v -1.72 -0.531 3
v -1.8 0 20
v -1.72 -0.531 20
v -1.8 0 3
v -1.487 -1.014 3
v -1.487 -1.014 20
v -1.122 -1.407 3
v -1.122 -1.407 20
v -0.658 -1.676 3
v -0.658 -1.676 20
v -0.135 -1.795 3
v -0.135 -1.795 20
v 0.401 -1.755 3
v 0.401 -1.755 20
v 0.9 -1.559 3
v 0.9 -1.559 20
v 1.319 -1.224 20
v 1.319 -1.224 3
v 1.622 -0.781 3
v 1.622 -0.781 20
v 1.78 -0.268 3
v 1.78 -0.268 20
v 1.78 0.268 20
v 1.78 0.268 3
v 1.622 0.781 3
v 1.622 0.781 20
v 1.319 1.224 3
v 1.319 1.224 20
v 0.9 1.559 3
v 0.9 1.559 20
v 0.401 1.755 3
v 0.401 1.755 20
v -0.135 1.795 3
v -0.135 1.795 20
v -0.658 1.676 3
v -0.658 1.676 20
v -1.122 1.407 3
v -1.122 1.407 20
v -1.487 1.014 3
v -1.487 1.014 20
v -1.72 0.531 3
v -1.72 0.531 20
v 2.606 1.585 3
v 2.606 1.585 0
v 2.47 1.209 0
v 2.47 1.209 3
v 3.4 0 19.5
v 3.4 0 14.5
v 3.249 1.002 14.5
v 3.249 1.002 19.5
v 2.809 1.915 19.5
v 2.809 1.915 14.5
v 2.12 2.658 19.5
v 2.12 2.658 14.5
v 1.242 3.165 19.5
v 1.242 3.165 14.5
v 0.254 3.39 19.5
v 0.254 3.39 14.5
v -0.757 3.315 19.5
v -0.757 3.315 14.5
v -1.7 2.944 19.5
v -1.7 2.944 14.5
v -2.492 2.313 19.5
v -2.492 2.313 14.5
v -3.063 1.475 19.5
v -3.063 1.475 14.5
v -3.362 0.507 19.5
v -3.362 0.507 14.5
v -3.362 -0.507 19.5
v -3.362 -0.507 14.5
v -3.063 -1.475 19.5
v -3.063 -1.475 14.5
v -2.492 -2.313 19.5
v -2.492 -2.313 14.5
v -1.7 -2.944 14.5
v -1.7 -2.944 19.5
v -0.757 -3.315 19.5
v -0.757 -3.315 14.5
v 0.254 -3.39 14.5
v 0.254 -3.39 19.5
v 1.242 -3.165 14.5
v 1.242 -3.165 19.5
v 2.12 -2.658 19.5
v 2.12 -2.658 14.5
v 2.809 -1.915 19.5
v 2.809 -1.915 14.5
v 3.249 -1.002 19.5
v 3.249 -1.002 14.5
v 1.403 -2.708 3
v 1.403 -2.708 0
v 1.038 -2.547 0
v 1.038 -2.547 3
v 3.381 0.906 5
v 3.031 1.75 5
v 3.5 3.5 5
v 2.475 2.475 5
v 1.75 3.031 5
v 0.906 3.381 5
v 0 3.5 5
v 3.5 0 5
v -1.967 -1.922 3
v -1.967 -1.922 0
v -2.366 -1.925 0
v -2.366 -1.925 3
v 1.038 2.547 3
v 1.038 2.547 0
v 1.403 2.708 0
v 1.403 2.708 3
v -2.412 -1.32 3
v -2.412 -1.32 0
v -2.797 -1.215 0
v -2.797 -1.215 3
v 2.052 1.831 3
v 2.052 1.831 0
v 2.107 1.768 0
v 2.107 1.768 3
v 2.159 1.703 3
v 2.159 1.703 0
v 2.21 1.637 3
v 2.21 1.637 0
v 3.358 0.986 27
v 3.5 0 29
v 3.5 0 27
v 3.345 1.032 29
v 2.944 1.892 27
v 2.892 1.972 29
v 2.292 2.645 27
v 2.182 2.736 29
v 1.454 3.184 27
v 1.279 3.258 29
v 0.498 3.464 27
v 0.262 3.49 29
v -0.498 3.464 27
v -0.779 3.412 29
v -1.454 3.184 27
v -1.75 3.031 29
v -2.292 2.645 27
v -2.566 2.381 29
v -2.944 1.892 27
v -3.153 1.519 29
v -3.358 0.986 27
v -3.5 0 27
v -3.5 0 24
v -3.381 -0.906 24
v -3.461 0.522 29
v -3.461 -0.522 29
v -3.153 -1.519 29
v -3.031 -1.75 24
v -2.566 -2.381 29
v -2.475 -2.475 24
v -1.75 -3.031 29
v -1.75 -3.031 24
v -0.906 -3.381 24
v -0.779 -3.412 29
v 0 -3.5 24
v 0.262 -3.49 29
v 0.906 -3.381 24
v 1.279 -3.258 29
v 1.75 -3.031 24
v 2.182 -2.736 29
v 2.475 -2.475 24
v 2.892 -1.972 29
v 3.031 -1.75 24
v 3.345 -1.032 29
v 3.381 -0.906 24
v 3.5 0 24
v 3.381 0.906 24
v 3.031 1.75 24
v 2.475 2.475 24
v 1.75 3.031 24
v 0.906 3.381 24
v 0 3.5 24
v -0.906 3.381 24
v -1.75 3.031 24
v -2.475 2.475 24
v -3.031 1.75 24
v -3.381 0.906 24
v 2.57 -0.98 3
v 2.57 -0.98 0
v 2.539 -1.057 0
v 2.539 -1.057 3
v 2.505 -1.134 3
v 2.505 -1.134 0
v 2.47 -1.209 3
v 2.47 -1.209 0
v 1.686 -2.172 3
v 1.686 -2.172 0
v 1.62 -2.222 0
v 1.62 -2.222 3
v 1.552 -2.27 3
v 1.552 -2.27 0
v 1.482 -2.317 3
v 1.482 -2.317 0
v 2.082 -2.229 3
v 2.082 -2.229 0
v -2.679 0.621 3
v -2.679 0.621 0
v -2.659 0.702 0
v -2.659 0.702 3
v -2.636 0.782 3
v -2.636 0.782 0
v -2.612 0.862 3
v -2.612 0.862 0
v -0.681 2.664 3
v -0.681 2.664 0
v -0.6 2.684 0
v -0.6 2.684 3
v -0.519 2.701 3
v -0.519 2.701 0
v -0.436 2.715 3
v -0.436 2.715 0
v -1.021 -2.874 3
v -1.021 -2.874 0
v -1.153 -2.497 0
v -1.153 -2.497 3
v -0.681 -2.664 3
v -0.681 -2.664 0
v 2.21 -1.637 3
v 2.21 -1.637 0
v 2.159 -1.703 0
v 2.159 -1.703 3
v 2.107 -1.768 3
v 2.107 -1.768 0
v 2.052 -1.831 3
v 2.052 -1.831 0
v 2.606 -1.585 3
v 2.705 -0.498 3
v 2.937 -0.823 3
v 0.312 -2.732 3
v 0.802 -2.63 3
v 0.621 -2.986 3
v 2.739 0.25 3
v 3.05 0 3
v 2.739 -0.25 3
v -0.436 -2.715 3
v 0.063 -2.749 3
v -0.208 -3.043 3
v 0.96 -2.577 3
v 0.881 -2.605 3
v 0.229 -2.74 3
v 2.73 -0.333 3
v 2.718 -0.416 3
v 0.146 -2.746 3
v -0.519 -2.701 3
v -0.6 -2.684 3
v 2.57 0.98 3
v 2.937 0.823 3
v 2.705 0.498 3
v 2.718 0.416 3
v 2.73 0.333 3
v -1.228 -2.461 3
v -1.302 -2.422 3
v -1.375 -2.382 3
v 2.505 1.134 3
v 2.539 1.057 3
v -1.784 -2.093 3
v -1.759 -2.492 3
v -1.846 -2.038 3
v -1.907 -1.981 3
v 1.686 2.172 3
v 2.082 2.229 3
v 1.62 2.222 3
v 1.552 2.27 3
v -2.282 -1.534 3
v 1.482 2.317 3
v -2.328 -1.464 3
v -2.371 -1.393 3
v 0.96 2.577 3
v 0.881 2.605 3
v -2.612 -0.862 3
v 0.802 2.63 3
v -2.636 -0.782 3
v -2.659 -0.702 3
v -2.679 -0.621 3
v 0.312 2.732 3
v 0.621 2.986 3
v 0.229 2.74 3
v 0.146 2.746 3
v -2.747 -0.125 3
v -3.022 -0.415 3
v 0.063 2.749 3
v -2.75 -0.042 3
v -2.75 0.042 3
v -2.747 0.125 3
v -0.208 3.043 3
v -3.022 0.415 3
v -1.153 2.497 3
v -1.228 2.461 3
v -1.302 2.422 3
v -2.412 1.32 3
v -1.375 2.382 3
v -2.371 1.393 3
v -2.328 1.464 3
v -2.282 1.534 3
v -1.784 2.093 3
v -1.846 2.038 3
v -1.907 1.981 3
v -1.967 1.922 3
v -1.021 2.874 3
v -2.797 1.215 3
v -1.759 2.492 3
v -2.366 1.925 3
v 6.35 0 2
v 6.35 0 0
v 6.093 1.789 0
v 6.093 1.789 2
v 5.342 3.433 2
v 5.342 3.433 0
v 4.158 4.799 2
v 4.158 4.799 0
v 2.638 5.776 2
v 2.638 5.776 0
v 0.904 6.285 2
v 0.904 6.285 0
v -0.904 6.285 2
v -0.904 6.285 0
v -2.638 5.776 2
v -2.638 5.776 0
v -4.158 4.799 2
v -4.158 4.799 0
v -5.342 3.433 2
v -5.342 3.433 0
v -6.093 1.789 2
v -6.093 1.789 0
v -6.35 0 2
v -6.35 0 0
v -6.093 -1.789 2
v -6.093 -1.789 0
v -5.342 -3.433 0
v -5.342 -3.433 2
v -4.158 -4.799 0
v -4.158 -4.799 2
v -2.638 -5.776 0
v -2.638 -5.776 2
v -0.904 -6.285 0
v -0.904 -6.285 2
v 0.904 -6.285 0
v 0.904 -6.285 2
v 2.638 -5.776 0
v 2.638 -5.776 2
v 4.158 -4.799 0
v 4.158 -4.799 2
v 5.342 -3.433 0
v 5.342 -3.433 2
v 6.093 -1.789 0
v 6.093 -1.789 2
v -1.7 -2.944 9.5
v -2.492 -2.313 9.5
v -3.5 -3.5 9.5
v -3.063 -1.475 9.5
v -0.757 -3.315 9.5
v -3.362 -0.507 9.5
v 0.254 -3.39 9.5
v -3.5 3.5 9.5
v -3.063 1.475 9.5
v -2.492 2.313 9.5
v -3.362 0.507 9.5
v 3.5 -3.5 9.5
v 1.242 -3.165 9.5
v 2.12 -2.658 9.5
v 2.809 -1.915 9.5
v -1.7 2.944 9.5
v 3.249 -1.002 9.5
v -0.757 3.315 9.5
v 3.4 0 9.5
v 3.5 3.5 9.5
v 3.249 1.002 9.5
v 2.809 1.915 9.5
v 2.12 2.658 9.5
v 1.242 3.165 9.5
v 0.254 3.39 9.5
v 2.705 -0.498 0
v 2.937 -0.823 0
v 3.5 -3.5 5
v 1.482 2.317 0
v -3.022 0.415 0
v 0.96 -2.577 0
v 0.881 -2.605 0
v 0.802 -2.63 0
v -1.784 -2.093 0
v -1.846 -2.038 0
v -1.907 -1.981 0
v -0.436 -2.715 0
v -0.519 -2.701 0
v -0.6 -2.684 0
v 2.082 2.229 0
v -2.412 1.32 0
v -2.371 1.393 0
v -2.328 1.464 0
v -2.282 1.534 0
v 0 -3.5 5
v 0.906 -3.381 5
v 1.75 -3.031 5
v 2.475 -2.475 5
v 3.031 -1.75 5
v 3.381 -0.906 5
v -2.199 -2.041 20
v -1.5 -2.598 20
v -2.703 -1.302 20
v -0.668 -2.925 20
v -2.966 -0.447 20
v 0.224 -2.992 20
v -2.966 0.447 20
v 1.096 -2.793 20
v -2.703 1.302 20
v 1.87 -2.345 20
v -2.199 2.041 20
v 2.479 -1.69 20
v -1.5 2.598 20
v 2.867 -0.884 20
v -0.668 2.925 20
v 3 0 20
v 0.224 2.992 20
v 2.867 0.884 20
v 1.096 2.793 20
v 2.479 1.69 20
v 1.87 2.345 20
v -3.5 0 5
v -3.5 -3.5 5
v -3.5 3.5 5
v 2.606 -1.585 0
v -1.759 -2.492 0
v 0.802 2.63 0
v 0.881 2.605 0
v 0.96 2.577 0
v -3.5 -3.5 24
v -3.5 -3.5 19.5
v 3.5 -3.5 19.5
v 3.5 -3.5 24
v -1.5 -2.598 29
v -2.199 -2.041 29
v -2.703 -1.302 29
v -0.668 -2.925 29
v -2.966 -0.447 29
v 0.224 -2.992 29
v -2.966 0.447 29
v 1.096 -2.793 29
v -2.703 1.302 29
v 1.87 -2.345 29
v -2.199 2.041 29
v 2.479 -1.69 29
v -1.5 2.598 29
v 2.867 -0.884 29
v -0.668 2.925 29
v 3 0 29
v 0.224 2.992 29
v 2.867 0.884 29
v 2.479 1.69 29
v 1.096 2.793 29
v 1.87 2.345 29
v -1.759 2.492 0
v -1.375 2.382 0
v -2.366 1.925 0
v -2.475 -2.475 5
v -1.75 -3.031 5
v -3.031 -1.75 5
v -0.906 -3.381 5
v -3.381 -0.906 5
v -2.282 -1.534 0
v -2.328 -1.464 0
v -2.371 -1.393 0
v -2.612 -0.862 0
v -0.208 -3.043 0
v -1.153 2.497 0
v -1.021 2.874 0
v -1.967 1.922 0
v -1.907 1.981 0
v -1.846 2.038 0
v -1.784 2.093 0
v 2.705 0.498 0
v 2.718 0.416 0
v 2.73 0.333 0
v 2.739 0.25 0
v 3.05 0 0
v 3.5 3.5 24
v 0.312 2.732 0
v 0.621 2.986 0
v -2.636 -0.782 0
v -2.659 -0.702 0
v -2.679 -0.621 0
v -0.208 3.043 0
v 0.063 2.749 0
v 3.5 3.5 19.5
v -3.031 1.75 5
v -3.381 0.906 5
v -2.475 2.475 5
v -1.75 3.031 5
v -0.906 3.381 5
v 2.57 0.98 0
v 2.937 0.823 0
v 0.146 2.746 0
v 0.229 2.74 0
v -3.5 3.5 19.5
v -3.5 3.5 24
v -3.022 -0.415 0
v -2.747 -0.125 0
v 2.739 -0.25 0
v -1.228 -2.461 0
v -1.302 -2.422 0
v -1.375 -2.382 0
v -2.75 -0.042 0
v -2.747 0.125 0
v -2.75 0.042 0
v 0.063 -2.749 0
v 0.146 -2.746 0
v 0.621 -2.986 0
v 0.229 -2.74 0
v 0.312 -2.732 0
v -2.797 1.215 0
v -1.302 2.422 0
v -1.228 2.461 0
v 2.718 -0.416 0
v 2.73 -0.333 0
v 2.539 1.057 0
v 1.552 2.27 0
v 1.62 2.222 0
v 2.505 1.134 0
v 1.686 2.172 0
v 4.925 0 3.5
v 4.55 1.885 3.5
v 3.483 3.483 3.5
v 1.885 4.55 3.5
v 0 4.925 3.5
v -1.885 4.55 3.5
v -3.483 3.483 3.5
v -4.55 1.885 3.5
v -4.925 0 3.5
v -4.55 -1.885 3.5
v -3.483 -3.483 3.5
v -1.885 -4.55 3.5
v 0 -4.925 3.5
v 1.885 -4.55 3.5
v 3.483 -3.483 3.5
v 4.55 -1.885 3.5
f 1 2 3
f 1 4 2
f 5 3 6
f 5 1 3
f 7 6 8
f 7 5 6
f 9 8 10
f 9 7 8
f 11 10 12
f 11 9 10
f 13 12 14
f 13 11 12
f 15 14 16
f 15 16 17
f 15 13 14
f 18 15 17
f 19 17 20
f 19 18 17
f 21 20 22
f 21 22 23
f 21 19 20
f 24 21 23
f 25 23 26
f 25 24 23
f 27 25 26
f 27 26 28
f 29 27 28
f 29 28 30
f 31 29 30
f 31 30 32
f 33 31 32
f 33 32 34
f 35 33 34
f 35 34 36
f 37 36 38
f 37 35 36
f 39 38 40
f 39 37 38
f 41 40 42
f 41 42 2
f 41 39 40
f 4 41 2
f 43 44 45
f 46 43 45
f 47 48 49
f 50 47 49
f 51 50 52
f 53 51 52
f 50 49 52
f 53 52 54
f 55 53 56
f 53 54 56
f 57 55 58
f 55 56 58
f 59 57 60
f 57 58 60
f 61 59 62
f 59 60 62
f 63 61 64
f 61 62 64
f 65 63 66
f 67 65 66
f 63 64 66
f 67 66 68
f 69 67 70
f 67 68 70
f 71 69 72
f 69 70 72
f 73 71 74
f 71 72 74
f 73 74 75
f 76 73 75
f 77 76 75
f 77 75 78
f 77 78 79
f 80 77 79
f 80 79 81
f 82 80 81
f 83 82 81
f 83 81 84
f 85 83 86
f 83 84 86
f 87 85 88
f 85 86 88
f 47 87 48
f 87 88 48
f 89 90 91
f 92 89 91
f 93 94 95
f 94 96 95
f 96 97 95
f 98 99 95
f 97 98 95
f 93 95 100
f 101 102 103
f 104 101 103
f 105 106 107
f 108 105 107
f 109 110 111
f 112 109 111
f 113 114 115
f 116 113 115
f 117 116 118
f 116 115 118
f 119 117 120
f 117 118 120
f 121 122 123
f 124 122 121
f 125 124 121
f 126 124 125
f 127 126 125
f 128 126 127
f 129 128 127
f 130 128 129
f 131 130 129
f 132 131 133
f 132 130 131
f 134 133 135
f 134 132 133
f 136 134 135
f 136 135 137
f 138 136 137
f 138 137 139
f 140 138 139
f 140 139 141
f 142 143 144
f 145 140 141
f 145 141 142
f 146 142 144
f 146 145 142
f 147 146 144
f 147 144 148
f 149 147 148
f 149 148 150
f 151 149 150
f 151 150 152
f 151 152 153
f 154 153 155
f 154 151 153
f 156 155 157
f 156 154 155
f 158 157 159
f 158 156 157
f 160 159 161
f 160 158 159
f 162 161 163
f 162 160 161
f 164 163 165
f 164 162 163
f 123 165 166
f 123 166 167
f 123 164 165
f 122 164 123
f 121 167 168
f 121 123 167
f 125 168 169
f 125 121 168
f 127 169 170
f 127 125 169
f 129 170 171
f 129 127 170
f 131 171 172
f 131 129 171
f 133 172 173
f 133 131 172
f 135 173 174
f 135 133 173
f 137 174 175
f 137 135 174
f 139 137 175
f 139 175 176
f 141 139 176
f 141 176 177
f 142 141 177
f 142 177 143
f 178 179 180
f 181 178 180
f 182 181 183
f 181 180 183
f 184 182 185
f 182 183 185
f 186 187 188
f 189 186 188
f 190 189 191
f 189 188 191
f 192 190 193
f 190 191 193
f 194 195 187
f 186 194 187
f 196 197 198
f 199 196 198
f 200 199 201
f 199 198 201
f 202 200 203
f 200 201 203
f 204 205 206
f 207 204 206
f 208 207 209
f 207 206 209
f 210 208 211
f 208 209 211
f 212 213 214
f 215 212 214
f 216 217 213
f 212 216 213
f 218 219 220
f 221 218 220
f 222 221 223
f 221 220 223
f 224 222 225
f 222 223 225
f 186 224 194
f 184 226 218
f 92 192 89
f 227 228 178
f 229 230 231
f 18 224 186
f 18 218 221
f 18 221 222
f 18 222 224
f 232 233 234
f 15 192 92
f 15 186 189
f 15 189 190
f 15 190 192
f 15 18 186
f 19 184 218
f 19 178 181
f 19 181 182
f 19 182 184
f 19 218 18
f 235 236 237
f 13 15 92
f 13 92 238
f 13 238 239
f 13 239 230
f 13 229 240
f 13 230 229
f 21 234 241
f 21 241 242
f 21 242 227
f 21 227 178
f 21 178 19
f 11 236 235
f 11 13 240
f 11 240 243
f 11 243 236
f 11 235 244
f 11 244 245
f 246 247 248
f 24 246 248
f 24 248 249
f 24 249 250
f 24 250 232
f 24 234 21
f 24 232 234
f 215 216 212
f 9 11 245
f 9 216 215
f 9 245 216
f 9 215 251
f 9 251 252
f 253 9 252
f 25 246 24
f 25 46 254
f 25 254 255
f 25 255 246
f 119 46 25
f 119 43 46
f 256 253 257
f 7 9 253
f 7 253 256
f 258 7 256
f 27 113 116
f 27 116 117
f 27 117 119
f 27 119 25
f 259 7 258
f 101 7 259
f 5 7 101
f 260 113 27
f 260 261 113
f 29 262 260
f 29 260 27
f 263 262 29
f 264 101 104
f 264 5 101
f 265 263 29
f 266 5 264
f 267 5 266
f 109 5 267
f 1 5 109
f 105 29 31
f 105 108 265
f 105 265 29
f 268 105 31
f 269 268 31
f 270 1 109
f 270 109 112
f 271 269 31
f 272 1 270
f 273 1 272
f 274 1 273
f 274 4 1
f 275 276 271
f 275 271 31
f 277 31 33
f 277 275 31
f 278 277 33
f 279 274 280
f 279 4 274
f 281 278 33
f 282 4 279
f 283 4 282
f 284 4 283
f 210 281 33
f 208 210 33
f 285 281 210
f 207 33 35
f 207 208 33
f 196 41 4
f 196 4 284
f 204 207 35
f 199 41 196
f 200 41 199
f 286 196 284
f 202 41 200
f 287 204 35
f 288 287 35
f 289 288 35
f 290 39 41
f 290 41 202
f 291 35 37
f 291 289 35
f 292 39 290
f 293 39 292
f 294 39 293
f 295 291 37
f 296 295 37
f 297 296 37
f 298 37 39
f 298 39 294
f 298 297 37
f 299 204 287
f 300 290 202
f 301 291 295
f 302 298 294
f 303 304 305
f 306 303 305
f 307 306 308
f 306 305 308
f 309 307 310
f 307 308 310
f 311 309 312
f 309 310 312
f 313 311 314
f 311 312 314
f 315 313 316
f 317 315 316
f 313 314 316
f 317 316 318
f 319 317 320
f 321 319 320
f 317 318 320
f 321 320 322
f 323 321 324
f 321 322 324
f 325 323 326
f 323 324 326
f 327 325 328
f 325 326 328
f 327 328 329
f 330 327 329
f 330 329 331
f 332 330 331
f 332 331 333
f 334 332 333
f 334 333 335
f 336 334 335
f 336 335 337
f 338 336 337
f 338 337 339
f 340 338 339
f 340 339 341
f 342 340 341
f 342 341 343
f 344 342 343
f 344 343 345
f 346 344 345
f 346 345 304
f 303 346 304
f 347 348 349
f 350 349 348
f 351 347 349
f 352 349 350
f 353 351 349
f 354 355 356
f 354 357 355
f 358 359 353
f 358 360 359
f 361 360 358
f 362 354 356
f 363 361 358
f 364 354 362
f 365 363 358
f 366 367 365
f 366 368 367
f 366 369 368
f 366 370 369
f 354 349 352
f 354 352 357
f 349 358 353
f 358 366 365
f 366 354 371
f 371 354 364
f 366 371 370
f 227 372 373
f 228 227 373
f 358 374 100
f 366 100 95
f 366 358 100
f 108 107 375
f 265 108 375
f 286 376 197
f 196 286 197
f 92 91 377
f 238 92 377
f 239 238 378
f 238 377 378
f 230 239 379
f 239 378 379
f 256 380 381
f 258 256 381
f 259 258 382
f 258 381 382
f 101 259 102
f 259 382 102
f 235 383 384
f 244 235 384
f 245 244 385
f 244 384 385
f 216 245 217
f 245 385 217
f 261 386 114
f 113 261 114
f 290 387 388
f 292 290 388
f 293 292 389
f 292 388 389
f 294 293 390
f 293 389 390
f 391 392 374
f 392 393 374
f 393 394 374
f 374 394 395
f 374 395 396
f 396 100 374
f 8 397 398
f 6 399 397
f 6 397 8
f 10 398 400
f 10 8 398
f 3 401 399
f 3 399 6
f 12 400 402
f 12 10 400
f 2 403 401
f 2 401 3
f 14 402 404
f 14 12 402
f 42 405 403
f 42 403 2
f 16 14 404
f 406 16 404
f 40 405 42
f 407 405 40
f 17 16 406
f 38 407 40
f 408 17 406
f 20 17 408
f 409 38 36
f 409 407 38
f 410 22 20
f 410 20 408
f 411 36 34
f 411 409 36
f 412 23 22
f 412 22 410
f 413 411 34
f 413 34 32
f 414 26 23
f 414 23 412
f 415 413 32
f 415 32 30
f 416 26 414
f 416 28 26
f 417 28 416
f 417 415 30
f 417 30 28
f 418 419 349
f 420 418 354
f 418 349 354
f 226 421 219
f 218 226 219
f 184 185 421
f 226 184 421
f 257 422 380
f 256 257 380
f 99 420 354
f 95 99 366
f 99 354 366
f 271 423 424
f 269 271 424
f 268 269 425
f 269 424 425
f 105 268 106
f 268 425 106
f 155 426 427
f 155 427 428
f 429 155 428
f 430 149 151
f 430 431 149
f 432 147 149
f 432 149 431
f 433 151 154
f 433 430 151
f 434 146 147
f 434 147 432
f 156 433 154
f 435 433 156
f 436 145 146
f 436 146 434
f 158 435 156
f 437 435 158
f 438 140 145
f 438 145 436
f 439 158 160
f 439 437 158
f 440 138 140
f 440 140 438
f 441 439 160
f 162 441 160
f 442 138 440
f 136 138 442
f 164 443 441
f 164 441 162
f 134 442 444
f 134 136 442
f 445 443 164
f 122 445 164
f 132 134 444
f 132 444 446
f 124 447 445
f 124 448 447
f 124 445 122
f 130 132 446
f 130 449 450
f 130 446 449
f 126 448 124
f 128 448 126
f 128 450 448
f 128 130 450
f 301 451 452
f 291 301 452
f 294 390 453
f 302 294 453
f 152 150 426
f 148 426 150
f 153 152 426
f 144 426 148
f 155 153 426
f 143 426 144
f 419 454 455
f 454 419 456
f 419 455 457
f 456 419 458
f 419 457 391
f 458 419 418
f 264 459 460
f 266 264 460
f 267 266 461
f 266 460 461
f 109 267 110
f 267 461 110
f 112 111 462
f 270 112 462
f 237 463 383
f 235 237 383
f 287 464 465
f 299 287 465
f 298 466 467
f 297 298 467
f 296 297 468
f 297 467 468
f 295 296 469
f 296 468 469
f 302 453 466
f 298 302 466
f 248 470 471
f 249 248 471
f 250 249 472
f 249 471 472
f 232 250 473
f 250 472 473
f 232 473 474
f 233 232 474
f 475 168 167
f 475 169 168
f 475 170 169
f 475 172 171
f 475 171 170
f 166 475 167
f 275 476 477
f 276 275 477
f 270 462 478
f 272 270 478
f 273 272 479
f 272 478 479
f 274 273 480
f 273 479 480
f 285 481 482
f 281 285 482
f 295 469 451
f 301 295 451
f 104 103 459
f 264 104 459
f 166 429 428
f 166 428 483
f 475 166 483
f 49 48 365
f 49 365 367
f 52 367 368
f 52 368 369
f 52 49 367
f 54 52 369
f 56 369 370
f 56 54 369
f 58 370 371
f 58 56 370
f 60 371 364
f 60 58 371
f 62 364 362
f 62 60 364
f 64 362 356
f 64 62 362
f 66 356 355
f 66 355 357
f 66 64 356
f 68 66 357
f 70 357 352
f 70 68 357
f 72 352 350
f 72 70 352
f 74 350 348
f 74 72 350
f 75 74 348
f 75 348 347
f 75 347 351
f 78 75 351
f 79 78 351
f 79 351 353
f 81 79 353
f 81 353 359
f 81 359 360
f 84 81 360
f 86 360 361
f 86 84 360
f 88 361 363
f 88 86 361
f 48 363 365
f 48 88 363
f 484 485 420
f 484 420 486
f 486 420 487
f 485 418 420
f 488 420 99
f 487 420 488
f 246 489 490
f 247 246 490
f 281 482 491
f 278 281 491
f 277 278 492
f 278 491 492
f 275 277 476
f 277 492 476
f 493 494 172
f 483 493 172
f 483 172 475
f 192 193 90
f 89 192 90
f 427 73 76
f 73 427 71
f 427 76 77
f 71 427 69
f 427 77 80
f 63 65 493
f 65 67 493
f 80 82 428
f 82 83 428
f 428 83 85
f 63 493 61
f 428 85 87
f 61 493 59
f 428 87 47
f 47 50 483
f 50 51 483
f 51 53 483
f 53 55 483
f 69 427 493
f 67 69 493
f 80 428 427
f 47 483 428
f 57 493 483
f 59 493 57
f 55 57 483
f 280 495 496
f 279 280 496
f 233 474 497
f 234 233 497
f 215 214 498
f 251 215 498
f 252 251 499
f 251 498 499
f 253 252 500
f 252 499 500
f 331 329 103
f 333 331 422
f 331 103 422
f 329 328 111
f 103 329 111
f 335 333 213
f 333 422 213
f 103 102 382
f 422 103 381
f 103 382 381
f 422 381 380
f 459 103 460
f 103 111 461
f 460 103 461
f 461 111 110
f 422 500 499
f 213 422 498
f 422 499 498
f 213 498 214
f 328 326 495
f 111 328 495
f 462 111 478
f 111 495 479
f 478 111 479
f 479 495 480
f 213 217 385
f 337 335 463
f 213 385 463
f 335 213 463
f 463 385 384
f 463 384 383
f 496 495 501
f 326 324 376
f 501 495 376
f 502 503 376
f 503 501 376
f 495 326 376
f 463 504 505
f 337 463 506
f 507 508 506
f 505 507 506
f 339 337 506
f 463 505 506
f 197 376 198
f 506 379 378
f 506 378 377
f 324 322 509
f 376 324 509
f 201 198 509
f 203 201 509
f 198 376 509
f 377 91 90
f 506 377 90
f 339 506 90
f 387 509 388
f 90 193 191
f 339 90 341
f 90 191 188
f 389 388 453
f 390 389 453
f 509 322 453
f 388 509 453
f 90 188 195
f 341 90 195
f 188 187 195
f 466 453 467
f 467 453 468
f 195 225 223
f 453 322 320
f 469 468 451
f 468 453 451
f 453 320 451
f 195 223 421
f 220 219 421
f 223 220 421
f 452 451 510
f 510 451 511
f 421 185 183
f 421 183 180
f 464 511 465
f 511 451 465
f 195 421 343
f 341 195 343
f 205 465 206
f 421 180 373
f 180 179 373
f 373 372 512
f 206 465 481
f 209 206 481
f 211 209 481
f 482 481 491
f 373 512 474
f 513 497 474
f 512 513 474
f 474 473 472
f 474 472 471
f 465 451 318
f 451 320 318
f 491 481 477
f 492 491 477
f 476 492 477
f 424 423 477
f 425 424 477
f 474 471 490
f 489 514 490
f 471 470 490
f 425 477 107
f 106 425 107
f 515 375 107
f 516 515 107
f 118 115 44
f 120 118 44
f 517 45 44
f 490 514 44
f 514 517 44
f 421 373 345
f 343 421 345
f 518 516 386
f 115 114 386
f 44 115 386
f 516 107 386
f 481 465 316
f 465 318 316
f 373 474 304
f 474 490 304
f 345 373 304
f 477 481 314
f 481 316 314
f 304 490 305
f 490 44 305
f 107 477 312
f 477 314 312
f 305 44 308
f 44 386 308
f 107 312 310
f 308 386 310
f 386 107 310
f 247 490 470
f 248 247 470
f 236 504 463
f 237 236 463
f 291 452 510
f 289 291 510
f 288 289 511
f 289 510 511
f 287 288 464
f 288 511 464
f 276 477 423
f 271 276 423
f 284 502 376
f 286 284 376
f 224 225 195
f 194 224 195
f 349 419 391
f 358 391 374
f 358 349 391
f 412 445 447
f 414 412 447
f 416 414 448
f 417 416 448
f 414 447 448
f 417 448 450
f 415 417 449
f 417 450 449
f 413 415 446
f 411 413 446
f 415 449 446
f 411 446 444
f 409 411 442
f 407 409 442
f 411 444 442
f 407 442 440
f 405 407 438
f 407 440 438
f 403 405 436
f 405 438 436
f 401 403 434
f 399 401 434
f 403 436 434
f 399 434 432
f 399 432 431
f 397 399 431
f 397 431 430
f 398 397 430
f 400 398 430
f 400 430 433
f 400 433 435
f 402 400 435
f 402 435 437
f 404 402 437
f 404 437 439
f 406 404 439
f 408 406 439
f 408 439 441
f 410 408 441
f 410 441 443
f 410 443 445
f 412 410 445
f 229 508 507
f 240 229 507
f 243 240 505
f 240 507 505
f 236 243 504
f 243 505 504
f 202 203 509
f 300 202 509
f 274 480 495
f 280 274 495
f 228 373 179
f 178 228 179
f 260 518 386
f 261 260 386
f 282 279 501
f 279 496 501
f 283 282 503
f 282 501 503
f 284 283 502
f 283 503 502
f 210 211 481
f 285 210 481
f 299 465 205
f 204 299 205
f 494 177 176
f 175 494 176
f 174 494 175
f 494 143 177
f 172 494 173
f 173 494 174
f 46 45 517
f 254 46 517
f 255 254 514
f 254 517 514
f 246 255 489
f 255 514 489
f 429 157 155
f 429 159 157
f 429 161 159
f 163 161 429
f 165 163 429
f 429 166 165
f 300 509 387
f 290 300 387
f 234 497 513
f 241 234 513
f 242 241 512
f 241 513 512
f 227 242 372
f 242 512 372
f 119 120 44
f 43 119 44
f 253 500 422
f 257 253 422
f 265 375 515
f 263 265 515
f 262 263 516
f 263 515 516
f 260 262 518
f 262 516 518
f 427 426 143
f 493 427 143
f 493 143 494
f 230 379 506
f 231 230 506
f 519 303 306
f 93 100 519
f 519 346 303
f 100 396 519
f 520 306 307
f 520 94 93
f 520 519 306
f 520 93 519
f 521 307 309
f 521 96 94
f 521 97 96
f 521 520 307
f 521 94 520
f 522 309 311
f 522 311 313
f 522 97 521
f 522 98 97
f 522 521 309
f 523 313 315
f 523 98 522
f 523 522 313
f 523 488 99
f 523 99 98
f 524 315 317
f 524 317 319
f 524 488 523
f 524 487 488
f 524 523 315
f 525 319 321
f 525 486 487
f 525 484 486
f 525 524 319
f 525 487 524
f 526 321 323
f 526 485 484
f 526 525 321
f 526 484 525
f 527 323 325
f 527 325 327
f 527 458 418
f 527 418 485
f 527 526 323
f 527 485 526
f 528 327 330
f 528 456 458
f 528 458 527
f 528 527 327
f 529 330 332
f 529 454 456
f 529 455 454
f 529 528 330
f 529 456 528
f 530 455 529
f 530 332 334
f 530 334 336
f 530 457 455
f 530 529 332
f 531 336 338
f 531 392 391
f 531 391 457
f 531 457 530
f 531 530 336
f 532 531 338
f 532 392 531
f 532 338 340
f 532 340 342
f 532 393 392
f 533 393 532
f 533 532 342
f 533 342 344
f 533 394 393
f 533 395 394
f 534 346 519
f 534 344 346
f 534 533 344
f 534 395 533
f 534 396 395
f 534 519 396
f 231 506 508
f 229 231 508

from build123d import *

# Parameters (mm, degrees)
SKETCH_2_R               = 3.5
EXTRUDE_3_DEPTH          = 19
SKETCH_1_R               = 6.35
EXTRUDE_4_DEPTH          = 2
SKETCH_5_R               = 3.5
EXTRUDE_5_DEPTH          = 2
SKETCH_6_R               = 2.75
CUT_EXTRUDE_1_DEPTH      = 3
SKETCH_7_R               = 1.8
CUT_EXTRUDE_2_DEPTH      = 28.507180927
SKETCH_8_R               = 3
CUT_EXTRUDE_3_DEPTH      = 23
CUT_EXTRUDE_5_DEPTH      = 3
SKETCH_14_W              = 7
SKETCH_14_H              = 7
SKETCH_14_R              = 3.4
EXTRUDE_7_DEPTH          = 19
SKETCH_16_W              = 7
SKETCH_16_H              = 7
SKETCH_16_R              = 3.4
CUT_EXTRUDE_6_DEPTH      = 5
CUT_EXTRUDE_6_DEPTH_BACK = 5
SKETCH_17_R              = 3
SKETCH_17_R_2            = 1.8
EXTRUDE_8_DEPTH          = 14


with BuildPart() as part:
    # ｽｹｯﾁ2 → ﾎﾞｽ - 押し出し3 (new body)
    with BuildSketch(Plane.XY.offset(5)):
        with Locations(Location((0, 0, 0), (0, 0, 180))):
            Circle(SKETCH_2_R)
    extrude(amount=EXTRUDE_3_DEPTH)


with BuildPart() as body_2:
    # ｽｹｯﾁ1 → ﾎﾞｽ - 押し出し4 (new body)
    with BuildSketch(Plane.XY):
        Circle(SKETCH_1_R)
    extrude(amount=EXTRUDE_4_DEPTH)


    add(part.part)  # loft_1 joins it to this body
    # loft from a face of the part (loft_1)
    loft([body_2.faces().sort_by_distance((0, 0, 2))[0], body_2.faces().sort_by_distance((0, 0, 5))[0]])



with BuildPart() as body_3:
    # ｽｹｯﾁ5 → ﾎﾞｽ - 押し出し5 (new body)
    with BuildSketch(Plane.XY.offset(29)):
        Circle(SKETCH_5_R)
    extrude(amount=-EXTRUDE_5_DEPTH)


with BuildPart() as body_2_1:
    add(body_2.part)

    add(body_3.part)  # loft_2 joins it to this body
    # loft from a face of the part (loft_2)
    loft([body_2_1.faces().sort_by_distance((0, 0, 24))[0], body_2_1.faces().sort_by_distance((0, 0, 27))[0]])

    # ｽｹｯﾁ6 → ｶｯﾄ - 押し出し1 (cut)
    with BuildSketch(Plane(origin=(0, 0, 0), x_dir=(-1, 0, 0), z_dir=(0, 0, -1))):
        Circle(SKETCH_6_R)
    extrude(amount=-CUT_EXTRUDE_1_DEPTH, mode=Mode.SUBTRACT)

    # ｽｹｯﾁ7 → ｶｯﾄ - 押し出し2 (cut, through all)
    with BuildSketch(Plane(origin=(0, 0, 3), x_dir=(-1, 0, 0), z_dir=(0, 0, -1))):
        Circle(SKETCH_7_R)
    extrude(amount=-CUT_EXTRUDE_2_DEPTH, mode=Mode.SUBTRACT)

    # ｽｹｯﾁ8 → ｶｯﾄ - 押し出し3 (cut)
    with BuildSketch(Plane.XY.offset(29)):
        Circle(SKETCH_8_R)
    extrude(amount=-CUT_EXTRUDE_3_DEPTH, mode=Mode.SUBTRACT)

    # ｽｹｯﾁ12 → ｶｯﾄ - 押し出し5 (cut)
    with BuildSketch(Plane(origin=(0, 0, 0), x_dir=(-1, 0, 0), z_dir=(0, 0, -1))):
        with BuildLine():
            Line((0.208139361, 3.042889746), (-0.062598794, 2.749287433))
            ThreePointArc((-0.062598794, 2.749287433), (0.187666637, 2.743589115), (0.436377003, 2.715156554))
            Line((0.436377003, 2.715156554), (0.208139361, 3.042889746))
        make_face()
        with BuildLine():
            Line((1.021382817, 2.873895812), (0.681471411, 2.66422535))
            ThreePointArc((0.681471411, 2.66422535), (0.920918933, 2.591217536), (1.152735431, 2.496738077))
            Line((1.152735431, 2.496738077), (1.021382817, 2.873895812))
        make_face()
        with BuildLine():
            Line((1.758874982, 2.491758174), (1.375, 2.38156986))
            ThreePointArc((1.375, 2.38156986), (1.585870886, 2.246667206), (1.783600746, 2.093147959))
            Line((1.783600746, 2.093147959), (1.758874982, 2.491758174))
        make_face()
        with BuildLine():
            Line((2.365919437, 1.92481823), (1.966551129, 1.922284229))
            ThreePointArc((1.966551129, 1.922284229), (2.133206049, 1.735491847), (2.282184553, 1.534318633))
            Line((2.282184553, 1.534318633), (2.365919437, 1.92481823))
        make_face()
        with BuildLine():
            Line((2.79749447, 1.215123324), (2.412252157, 1.320431571))
            ThreePointArc((2.412252157, 1.320431571), (2.522331079, 1.095602997), (2.611509172, 0.861695912))
            Line((2.611509172, 0.861695912), (2.79749447, 1.215123324))
        make_face()
        with BuildLine():
            Line((3.021592135, 0.41530828), (2.679047477, 0.620648543))
            ThreePointArc((2.679047477, 0.620648543), (2.724386352, 0.374458285), (2.747150103, 0.125165148))
            Line((2.747150103, 0.125165148), (3.021592135, 0.41530828))
        make_face()
        with BuildLine():
            Line((3.021592135, -0.41530828), (2.747150103, -0.125165148))
            ThreePointArc((2.747150103, -0.125165148), (2.724386352, -0.374458285), (2.679047477, -0.620648543))
            Line((2.679047477, -0.620648543), (3.021592135, -0.41530828))
        make_face()
        with BuildLine():
            Line((2.79749447, -1.215123324), (2.611509172, -0.861695912))
            ThreePointArc((2.611509172, -0.861695912), (2.522331079, -1.095602997), (2.412252157, -1.320431571))
            Line((2.412252157, -1.320431571), (2.79749447, -1.215123324))
        make_face()
        with BuildLine():
            Line((2.365919437, -1.92481823), (2.282184553, -1.534318633))
            ThreePointArc((2.282184553, -1.534318633), (2.133206049, -1.735491847), (1.966551129, -1.922284229))
            Line((1.966551129, -1.922284229), (2.365919437, -1.92481823))
        make_face()
        with BuildLine():
            Line((1.758874982, -2.491758174), (1.783600746, -2.093147959))
            ThreePointArc((1.783600746, -2.093147959), (1.585870886, -2.246667206), (1.375, -2.38156986))
            Line((1.375, -2.38156986), (1.758874982, -2.491758174))
        make_face()
        with BuildLine():
            Line((1.021382817, -2.873895812), (1.152735431, -2.496738077))
            ThreePointArc((1.152735431, -2.496738077), (0.920918933, -2.591217536), (0.681471411, -2.66422535))
            Line((0.681471411, -2.66422535), (1.021382817, -2.873895812))
        make_face()
        with BuildLine():
            Line((0.208139361, -3.042889746), (0.436377003, -2.715156554))
            ThreePointArc((0.436377003, -2.715156554), (0.187666637, -2.743589115), (-0.062598794, -2.749287433))
            Line((-0.062598794, -2.749287433), (0.208139361, -3.042889746))
        make_face()
        with BuildLine():
            Line((-0.62054084, -2.986206467), (-0.312345512, -2.73220429))
            ThreePointArc((-0.312345512, -2.73220429), (-0.559504036, -2.692481241), (-0.802026334, -2.630447445))
            Line((-0.802026334, -2.630447445), (-0.62054084, -2.986206467))
        make_face()
        with BuildLine():
            Line((-1.403198365, -2.708049916), (-1.037902788, -2.546616933))
            ThreePointArc((-1.037902788, -2.546616933), (-1.265178854, -2.441684351), (-1.481971249, -2.316519203))
            Line((-1.481971249, -2.316519203), (-1.403198365, -2.708049916))
        make_face()
        with BuildLine():
            Line((-2.081787087, -2.229049691), (-1.686483563, -2.172158648))
            ThreePointArc((-1.686483563, -2.172158648), (-1.877021144, -2.009798902), (-2.052005136, -1.830785329))
            Line((-2.052005136, -1.830785329), (-2.081787087, -2.229049691))
        make_face()
        with BuildLine():
            Line((-2.605979184, -1.584731048), (-2.209985568, -1.636601293))
            ThreePointArc((-2.209985568, -1.636601293), (-2.349653363, -1.428855863), (-2.46985119, -1.209270483))
            Line((-2.46985119, -1.209270483), (-2.605979184, -1.584731048))
        make_face()
        with BuildLine():
            Line((-2.936897726, -0.822880152), (-2.569583052, -0.979664707))
            ThreePointArc((-2.569583052, -0.979664707), (-2.64802254, -0.741941121), (-2.704519679, -0.498069577))
            Line((-2.704519679, -0.498069577), (-2.936897726, -0.822880152))
        make_face()
        with BuildLine():
            Line((-3.05, 0), (-2.738606317, -0.250070871))
            ThreePointArc((-2.738606317, -0.250070871), (-2.75, 0), (-2.738606317, 0.250070871))
            Line((-2.738606317, 0.250070871), (-3.05, 0))
        make_face()
        with BuildLine():
            Line((-2.936897726, 0.822880152), (-2.704519679, 0.498069577))
            ThreePointArc((-2.704519679, 0.498069577), (-2.64802254, 0.741941121), (-2.569583052, 0.979664707))
            Line((-2.569583052, 0.979664707), (-2.936897726, 0.822880152))
        make_face()
        with BuildLine():
            Line((-2.605979184, 1.584731048), (-2.46985119, 1.209270483))
            ThreePointArc((-2.46985119, 1.209270483), (-2.349653363, 1.428855863), (-2.209985568, 1.636601293))
            Line((-2.209985568, 1.636601293), (-2.605979184, 1.584731048))
        make_face()
        with BuildLine():
            Line((-2.081787087, 2.229049691), (-2.052005136, 1.830785329))
            ThreePointArc((-2.052005136, 1.830785329), (-1.877021144, 2.009798902), (-1.686483563, 2.172158648))
            Line((-1.686483563, 2.172158648), (-2.081787087, 2.229049691))
        make_face()
        with BuildLine():
            Line((-1.403198365, 2.708049916), (-1.481971249, 2.316519203))
            ThreePointArc((-1.481971249, 2.316519203), (-1.265178854, 2.441684351), (-1.037902788, 2.546616933))
            Line((-1.037902788, 2.546616933), (-1.403198365, 2.708049916))
        make_face()
        with BuildLine():
            Line((-0.62054084, 2.986206467), (-0.802026334, 2.630447445))
            ThreePointArc((-0.802026334, 2.630447445), (-0.559504036, 2.692481241), (-0.312345512, 2.73220429))
            Line((-0.312345512, 2.73220429), (-0.62054084, 2.986206467))
        make_face()
    extrude(amount=-CUT_EXTRUDE_5_DEPTH, mode=Mode.SUBTRACT)

    # ｽｹｯﾁ14 → ﾎﾞｽ - 押し出し7 (add)
    with BuildSketch(Plane.XY.offset(24)):
        Rectangle(SKETCH_14_W, SKETCH_14_H)
        Circle(SKETCH_14_R, mode=Mode.SUBTRACT)
    extrude(amount=-EXTRUDE_7_DEPTH)

    # ｽｹｯﾁ16 → ｶｯﾄ - 押し出し6 (cut, two sides)
    with BuildSketch(Plane.XY.offset(14.5)) as cut_extrude_6_sk:
        Rectangle(SKETCH_16_W, SKETCH_16_H)
        Circle(SKETCH_16_R, mode=Mode.SUBTRACT)
    extrude(amount=CUT_EXTRUDE_6_DEPTH, mode=Mode.SUBTRACT)
    extrude(cut_extrude_6_sk.sketch, amount=-CUT_EXTRUDE_6_DEPTH_BACK, mode=Mode.SUBTRACT)

    # ｽｹｯﾁ17 → ﾎﾞｽ - 押し出し8 (add)
    with BuildSketch(Plane.XY.offset(6)):
        Circle(SKETCH_17_R)
        with Locations(Location((0, 0, 0), (0, 0, 180))):
            Circle(SKETCH_17_R_2, mode=Mode.SUBTRACT)
    extrude(amount=EXTRUDE_8_DEPTH)


solid = body_2_1.part
